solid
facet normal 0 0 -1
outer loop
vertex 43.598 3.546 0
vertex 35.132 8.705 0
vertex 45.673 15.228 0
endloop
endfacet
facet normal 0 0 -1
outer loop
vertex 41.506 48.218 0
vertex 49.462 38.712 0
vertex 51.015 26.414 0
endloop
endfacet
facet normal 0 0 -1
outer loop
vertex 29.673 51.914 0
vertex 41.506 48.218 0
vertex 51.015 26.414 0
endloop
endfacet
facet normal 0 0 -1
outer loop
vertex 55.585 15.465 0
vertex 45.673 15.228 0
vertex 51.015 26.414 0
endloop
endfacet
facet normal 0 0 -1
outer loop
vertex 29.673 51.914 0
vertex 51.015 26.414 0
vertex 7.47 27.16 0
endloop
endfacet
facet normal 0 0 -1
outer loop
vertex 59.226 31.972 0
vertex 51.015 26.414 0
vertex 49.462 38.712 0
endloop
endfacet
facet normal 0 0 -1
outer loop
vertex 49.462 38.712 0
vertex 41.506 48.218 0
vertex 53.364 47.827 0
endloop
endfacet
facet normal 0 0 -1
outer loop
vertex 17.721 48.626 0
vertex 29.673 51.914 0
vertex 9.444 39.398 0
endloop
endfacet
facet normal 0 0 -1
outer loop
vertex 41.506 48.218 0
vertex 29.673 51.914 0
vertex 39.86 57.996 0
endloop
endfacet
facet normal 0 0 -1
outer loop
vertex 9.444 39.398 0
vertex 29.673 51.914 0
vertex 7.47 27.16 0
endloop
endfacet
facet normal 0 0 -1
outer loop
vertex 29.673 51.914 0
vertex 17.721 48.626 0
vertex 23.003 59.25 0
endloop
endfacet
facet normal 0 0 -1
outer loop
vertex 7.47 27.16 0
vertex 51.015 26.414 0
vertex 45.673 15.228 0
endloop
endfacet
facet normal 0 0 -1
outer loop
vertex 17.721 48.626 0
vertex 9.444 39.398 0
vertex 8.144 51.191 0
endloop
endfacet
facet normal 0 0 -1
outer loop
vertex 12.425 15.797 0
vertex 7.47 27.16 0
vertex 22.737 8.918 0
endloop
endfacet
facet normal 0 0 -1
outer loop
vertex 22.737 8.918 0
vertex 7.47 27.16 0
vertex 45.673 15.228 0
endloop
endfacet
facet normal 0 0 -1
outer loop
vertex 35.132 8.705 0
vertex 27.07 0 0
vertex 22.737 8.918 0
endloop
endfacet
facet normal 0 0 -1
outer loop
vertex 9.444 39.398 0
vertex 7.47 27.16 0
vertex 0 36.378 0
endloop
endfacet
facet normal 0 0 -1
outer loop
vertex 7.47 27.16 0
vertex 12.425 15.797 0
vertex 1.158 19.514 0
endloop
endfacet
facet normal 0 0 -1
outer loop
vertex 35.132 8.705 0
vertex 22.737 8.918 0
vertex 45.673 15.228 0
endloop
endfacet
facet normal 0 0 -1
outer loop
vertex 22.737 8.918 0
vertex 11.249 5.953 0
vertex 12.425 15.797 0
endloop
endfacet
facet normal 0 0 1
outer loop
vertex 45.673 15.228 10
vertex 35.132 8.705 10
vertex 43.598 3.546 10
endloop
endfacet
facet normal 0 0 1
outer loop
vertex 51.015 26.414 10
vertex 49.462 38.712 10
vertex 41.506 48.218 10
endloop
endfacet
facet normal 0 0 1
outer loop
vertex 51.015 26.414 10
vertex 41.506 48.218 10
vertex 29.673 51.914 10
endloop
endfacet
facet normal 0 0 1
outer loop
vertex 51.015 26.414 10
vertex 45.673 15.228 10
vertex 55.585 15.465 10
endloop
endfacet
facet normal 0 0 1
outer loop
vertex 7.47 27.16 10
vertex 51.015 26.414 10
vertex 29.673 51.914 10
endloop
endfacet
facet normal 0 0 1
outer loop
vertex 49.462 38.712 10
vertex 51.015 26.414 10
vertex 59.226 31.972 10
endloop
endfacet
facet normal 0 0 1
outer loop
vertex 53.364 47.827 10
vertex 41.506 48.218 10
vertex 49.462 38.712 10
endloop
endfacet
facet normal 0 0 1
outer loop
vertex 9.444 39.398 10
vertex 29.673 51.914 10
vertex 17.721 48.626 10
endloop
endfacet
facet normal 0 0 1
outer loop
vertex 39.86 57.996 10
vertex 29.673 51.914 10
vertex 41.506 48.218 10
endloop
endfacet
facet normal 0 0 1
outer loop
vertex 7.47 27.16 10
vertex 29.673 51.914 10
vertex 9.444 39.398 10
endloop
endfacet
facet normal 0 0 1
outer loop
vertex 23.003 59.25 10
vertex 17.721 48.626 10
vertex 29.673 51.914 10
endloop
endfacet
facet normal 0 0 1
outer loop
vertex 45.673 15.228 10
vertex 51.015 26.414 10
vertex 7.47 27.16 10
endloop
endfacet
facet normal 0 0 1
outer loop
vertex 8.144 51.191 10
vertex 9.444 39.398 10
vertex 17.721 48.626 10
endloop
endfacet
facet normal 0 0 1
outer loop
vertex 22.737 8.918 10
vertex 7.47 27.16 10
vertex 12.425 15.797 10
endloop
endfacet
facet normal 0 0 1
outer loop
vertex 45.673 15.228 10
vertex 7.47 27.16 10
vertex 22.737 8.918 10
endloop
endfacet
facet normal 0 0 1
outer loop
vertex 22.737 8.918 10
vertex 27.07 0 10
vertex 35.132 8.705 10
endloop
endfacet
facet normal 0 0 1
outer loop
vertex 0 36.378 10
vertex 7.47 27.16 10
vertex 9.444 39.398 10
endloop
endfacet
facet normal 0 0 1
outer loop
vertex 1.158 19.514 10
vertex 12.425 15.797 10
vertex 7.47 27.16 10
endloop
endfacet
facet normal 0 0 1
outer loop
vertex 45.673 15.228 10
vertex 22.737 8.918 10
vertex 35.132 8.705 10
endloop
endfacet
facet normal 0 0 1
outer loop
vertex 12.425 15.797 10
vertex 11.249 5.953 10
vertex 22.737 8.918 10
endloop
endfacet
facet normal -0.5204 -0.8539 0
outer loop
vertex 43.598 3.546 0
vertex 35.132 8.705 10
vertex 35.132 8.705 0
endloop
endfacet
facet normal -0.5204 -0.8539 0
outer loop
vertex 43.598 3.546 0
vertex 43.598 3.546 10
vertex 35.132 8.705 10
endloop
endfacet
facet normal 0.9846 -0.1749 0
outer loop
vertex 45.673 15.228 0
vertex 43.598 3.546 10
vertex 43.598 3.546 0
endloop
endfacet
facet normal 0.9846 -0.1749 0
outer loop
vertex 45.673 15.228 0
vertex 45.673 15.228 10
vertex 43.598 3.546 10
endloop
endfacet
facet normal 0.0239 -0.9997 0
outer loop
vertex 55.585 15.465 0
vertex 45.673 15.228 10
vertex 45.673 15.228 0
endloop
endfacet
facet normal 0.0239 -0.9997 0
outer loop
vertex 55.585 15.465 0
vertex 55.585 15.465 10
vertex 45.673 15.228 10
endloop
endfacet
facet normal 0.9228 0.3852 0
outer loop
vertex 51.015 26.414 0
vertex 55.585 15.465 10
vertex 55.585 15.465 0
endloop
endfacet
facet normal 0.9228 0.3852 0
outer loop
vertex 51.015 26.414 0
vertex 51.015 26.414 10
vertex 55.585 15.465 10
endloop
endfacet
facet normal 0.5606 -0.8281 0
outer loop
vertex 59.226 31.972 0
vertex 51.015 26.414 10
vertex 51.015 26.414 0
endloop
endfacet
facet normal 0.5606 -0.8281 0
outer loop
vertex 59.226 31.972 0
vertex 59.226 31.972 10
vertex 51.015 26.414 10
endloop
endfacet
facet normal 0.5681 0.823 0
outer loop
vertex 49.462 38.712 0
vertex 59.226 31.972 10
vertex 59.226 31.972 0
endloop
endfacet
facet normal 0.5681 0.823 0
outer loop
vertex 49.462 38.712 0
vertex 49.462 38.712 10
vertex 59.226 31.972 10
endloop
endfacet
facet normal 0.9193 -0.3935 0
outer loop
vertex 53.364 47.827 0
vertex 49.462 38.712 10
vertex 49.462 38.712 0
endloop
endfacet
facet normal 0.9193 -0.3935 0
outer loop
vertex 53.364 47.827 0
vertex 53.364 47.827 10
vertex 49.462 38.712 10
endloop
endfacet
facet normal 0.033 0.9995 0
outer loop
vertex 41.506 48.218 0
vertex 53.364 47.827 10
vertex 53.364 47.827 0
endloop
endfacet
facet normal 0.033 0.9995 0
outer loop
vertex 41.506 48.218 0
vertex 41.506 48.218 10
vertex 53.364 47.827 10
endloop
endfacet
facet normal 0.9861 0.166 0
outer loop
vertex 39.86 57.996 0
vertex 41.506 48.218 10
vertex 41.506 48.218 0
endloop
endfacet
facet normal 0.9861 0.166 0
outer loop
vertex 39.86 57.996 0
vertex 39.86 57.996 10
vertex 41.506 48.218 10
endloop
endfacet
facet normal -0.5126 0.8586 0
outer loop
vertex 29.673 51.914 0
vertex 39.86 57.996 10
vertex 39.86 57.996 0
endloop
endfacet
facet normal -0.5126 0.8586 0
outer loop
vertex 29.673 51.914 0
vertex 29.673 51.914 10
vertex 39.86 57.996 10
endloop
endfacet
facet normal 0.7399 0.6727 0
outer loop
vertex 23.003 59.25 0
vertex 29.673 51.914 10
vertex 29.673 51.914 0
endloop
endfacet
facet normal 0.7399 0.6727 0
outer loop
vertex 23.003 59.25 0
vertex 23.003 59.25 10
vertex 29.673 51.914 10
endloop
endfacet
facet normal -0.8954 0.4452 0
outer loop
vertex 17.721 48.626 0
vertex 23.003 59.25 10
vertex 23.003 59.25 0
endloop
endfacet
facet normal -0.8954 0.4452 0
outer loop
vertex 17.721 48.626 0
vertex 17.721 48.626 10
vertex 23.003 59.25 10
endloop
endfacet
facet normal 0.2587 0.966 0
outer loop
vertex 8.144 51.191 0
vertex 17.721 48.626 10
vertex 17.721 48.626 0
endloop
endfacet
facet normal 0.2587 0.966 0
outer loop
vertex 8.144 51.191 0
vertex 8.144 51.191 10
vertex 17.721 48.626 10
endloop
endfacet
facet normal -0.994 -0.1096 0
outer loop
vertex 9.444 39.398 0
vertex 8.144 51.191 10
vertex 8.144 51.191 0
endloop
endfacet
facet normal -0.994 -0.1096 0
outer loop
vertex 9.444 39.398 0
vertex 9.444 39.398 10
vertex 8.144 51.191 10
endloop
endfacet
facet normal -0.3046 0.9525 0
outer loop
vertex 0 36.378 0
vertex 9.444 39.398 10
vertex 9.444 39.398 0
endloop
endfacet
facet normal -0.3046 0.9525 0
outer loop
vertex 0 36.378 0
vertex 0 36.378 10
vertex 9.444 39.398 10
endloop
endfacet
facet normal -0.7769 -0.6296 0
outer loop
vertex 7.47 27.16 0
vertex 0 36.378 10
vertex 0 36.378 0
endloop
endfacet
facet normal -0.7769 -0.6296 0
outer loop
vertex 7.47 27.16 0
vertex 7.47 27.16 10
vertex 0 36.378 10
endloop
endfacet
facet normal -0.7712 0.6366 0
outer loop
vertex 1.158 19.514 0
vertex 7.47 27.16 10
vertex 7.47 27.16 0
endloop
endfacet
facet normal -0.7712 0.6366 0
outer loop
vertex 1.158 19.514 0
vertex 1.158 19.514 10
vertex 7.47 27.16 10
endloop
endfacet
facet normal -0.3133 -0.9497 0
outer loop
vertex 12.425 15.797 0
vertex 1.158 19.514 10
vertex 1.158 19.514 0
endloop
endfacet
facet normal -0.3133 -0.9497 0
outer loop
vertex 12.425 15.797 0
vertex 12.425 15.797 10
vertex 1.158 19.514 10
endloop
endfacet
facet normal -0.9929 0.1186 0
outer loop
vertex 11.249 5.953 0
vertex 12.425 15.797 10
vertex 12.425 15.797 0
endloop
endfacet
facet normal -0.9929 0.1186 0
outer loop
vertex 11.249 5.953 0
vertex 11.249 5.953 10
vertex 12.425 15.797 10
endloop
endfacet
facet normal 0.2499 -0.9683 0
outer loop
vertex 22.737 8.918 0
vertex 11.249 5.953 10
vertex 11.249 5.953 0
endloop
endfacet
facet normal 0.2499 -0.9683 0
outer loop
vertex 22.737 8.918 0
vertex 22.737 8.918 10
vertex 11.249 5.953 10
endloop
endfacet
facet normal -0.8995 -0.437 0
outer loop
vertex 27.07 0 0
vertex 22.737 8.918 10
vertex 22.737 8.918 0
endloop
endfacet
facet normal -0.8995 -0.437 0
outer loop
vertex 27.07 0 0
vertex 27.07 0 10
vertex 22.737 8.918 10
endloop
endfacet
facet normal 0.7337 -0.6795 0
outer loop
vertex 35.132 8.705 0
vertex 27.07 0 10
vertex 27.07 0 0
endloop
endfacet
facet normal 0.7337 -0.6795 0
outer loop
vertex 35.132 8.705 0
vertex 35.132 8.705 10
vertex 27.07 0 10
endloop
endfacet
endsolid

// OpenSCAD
$fn = 32;

// ----------------------------------------------------------------------
// Chain sprocket: 11 teeth, 22 mm root radius
// ----------------------------------------------------------------------

// --- parameters (mm) ---
profile_height = 10;      // extrusion height
profile_points = 22;      // points of the closed outline

profile = [[51.015, 26.414], [59.226, 31.972], [49.462, 38.712], [53.364, 47.827], [41.506, 48.218], [39.86, 57.996], [29.673, 51.914], [23.003, 59.25], [17.721, 48.626], [8.144, 51.191], [9.444, 39.398], [0, 36.378], [7.47, 27.16], [1.158, 19.514], [12.425, 15.797], [11.249, 5.953], [22.737, 8.918], [27.07, 0], [35.132, 8.705], [43.598, 3.546], [45.673, 15.228], [55.585, 15.465]];  // single closed polygon, 22 points, counter clockwise

// --- the one profile operation ---
linear_extrude(height = profile_height) polygon(points = profile);
